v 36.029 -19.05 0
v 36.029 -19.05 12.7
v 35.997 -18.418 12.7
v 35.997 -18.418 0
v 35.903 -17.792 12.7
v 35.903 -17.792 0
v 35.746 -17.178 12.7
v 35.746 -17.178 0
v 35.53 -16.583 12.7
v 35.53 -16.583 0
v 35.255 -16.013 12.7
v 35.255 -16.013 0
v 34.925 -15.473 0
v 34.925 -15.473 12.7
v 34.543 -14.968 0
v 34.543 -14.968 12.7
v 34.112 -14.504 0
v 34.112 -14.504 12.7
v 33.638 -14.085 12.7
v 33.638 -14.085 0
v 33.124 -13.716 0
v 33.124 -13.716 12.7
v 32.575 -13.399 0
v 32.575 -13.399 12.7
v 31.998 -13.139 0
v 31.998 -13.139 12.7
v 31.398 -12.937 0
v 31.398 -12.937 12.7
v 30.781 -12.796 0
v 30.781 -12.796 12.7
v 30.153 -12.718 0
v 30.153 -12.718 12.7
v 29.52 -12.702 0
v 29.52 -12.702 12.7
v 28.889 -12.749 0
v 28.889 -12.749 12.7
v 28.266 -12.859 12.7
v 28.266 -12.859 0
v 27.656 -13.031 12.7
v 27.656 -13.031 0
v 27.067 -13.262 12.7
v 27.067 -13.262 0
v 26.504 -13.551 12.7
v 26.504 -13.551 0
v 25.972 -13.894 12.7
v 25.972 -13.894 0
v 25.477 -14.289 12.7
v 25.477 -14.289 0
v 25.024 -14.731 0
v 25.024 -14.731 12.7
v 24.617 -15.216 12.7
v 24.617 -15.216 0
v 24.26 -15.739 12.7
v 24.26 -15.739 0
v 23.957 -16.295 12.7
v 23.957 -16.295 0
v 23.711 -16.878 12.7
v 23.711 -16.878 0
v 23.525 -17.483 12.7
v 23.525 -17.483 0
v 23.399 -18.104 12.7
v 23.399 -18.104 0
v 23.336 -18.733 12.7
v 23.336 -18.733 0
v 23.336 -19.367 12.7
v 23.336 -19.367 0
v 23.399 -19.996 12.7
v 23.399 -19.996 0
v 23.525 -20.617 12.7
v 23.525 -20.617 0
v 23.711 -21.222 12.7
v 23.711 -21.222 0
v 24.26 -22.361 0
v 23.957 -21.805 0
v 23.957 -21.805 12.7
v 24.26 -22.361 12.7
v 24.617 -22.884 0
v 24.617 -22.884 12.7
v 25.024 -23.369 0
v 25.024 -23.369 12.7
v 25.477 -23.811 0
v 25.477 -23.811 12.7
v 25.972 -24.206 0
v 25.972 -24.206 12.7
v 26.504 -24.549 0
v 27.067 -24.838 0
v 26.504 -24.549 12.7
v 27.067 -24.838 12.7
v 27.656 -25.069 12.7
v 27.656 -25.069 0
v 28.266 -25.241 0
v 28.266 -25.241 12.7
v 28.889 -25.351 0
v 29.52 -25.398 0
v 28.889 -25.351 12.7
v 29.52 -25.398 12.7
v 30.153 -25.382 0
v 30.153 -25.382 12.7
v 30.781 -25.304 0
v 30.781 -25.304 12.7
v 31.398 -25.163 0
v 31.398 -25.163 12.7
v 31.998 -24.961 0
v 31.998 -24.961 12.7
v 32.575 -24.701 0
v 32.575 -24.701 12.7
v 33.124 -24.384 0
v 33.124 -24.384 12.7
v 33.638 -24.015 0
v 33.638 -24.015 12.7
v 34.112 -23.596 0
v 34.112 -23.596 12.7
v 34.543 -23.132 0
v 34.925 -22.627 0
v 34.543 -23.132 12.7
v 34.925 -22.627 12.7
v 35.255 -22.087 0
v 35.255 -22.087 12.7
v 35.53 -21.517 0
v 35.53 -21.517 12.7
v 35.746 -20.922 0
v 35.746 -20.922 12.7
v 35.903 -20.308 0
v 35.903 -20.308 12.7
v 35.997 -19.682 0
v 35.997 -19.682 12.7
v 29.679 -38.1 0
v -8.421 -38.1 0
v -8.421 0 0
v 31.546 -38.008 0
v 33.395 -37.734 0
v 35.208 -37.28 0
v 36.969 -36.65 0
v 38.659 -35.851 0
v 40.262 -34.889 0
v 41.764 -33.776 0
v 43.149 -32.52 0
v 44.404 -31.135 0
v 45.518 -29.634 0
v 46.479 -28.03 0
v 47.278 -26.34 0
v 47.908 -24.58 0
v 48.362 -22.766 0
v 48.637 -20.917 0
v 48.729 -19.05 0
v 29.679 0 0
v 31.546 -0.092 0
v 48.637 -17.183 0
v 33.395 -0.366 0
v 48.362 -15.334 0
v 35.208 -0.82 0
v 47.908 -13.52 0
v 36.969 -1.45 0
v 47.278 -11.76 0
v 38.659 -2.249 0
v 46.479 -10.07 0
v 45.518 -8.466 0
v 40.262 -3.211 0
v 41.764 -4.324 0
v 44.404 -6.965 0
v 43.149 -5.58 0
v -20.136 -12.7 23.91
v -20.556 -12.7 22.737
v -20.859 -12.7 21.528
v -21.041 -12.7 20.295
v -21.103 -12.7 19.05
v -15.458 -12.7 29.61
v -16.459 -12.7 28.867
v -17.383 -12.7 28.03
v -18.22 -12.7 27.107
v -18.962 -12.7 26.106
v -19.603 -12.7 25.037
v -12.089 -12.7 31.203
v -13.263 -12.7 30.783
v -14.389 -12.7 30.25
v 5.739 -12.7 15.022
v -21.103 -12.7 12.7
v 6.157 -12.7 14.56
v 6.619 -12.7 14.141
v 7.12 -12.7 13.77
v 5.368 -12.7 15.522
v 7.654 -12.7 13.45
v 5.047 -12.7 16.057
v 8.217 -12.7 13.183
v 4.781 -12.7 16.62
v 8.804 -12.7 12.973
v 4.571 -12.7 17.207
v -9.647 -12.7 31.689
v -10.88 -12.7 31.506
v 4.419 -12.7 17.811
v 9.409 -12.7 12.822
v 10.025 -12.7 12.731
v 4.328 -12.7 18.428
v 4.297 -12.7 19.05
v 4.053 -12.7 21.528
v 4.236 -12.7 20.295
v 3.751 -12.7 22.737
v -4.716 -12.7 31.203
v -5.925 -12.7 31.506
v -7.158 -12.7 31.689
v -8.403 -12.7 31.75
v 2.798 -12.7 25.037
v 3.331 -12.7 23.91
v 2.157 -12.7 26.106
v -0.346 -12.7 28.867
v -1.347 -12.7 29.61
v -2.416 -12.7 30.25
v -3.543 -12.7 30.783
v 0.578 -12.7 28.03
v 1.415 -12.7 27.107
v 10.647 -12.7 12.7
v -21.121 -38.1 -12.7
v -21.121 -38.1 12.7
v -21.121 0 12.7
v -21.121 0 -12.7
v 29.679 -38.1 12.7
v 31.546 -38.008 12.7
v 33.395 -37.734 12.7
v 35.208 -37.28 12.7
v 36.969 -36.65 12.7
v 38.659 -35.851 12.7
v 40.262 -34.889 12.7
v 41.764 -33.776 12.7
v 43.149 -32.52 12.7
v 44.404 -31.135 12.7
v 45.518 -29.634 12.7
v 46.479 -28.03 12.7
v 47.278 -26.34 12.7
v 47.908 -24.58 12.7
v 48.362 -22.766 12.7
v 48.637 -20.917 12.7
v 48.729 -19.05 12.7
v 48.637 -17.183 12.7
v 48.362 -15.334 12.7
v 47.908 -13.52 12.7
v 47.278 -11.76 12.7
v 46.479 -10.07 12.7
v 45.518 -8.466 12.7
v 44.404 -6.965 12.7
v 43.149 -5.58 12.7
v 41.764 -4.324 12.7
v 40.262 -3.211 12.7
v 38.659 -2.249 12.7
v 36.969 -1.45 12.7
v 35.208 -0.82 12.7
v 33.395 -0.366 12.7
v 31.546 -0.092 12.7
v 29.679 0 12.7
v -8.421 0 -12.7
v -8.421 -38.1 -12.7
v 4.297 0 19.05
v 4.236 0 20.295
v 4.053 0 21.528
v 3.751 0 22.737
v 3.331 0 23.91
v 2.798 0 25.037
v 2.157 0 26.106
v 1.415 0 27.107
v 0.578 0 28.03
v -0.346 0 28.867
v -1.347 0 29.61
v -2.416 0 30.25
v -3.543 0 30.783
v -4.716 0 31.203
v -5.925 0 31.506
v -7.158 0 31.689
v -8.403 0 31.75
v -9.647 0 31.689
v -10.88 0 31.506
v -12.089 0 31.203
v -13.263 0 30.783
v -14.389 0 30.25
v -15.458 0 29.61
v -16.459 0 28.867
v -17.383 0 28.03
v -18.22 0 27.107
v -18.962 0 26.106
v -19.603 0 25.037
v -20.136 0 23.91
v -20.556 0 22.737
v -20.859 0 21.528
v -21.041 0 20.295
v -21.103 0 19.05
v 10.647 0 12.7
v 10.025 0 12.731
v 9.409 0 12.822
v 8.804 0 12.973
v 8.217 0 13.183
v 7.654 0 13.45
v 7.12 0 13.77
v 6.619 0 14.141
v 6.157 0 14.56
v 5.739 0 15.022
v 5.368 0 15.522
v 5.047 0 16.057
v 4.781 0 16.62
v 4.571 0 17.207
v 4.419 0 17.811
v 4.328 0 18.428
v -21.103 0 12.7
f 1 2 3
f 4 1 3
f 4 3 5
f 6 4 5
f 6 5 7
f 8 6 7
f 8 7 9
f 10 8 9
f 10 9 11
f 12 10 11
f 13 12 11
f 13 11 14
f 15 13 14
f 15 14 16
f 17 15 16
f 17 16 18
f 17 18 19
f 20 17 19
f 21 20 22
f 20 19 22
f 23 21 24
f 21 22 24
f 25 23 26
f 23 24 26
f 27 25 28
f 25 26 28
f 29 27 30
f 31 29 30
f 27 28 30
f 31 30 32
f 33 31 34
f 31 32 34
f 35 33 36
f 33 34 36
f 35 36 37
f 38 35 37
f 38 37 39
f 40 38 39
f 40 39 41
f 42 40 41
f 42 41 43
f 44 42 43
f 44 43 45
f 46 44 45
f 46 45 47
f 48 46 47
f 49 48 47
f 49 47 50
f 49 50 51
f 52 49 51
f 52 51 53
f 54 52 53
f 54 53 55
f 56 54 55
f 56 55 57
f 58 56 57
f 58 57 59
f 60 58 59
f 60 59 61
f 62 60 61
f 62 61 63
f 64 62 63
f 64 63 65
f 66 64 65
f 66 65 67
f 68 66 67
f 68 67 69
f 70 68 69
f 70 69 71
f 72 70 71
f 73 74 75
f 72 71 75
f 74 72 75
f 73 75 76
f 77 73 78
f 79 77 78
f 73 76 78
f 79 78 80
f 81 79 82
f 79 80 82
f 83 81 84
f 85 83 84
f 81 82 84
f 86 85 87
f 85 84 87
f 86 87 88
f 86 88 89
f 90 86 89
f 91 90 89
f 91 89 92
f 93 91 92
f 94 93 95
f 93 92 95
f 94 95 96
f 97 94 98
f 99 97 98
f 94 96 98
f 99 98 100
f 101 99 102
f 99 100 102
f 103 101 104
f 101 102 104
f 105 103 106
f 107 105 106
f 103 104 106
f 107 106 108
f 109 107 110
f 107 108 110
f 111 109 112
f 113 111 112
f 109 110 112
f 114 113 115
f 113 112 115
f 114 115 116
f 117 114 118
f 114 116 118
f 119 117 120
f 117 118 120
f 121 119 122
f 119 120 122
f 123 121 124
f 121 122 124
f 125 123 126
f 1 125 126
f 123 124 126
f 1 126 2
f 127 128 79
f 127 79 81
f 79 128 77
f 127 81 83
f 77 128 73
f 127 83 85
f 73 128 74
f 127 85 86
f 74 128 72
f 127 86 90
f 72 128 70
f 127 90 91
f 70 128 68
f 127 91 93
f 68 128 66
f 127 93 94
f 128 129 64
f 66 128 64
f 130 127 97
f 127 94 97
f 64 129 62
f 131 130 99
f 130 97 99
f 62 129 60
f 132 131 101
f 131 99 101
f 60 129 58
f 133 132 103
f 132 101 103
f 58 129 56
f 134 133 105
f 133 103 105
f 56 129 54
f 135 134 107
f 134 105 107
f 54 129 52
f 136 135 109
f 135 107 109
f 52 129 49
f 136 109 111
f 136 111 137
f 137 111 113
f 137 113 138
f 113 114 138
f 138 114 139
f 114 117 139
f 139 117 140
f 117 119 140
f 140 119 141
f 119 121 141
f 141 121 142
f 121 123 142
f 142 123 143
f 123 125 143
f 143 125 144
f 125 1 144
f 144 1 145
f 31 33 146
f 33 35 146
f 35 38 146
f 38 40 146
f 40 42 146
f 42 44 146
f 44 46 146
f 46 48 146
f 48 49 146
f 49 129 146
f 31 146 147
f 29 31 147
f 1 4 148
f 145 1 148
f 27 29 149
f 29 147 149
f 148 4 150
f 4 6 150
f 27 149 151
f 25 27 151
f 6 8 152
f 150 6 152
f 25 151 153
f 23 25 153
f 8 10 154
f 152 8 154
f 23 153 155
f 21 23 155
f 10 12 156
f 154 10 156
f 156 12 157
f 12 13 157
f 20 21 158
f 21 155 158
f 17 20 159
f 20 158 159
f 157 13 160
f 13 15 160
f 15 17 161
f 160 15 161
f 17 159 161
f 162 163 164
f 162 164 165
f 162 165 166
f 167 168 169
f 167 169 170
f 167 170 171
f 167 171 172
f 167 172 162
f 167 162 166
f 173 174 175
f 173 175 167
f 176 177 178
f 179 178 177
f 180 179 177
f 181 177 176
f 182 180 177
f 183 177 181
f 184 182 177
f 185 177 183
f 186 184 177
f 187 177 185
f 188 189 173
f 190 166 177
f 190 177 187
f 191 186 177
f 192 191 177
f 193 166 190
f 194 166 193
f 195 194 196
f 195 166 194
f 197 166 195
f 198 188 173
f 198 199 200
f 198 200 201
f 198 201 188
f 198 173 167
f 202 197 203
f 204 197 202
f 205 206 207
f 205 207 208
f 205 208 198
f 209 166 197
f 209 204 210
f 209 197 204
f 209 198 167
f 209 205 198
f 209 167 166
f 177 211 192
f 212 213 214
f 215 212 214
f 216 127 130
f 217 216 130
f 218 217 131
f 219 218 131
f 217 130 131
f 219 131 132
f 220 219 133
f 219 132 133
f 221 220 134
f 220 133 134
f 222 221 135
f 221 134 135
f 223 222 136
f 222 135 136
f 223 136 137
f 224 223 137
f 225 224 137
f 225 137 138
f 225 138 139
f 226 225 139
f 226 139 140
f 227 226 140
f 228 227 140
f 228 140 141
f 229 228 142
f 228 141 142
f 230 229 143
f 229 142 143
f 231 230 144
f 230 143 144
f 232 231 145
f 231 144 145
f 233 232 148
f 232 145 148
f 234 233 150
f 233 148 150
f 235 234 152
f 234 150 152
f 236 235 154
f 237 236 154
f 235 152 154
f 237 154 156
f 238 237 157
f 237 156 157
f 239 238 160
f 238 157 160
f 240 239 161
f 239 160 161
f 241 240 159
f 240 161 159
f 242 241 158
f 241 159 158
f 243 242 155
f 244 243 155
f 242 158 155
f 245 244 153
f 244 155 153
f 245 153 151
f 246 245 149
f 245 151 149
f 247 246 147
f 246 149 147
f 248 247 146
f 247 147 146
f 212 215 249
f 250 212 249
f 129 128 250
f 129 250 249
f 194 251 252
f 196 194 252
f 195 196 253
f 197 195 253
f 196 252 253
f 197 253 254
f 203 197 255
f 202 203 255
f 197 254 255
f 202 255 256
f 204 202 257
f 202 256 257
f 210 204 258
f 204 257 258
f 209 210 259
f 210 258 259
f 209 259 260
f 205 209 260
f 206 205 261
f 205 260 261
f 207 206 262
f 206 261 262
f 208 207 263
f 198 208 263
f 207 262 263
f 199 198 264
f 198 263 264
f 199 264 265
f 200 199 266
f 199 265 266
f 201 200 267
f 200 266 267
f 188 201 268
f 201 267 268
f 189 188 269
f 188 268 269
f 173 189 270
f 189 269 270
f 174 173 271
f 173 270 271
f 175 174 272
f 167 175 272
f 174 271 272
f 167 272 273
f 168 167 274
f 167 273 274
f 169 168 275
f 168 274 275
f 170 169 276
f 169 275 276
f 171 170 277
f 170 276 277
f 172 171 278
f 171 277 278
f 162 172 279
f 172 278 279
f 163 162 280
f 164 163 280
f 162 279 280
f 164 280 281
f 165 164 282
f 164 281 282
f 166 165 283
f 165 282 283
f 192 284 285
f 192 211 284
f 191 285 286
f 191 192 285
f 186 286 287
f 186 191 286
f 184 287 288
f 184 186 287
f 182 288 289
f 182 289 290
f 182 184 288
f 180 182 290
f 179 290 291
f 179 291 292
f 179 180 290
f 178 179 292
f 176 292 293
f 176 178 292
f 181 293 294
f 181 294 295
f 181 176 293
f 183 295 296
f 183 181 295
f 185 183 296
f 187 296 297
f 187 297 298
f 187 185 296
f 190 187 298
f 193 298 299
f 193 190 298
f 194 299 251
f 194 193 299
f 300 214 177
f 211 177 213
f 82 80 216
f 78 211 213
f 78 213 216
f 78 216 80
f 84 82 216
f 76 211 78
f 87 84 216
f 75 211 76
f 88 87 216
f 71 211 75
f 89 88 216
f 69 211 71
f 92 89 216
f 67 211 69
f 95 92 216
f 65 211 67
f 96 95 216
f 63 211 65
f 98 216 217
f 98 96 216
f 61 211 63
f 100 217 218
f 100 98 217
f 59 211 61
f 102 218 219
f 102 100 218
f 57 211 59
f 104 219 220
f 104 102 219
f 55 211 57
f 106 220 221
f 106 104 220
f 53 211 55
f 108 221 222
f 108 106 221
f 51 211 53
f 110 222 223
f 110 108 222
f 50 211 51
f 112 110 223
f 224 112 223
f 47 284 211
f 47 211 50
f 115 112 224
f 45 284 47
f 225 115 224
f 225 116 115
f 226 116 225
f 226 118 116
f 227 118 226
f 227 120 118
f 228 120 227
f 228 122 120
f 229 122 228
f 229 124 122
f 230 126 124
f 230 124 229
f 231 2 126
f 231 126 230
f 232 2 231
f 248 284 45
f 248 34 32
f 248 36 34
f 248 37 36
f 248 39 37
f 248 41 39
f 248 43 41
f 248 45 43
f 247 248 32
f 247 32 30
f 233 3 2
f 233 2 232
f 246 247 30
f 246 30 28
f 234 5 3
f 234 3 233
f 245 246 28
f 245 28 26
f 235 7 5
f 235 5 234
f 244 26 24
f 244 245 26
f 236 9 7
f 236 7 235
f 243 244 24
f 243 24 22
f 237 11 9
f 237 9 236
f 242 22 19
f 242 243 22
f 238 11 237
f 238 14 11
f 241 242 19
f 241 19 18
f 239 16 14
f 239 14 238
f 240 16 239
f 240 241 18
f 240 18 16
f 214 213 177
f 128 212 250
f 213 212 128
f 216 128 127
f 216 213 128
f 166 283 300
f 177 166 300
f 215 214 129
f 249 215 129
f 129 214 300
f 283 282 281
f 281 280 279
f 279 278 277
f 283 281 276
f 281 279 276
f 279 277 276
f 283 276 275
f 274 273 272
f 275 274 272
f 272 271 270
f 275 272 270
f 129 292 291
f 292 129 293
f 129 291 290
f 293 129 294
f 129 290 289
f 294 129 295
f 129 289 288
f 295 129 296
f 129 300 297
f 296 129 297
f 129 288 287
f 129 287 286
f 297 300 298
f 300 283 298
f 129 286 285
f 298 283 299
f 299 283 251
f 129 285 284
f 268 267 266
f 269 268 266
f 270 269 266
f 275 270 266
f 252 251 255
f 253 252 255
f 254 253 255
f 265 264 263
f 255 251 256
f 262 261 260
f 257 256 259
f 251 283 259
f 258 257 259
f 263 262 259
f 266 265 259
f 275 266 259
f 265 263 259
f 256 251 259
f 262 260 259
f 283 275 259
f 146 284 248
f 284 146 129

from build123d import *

# Parameters (mm, degrees)
F1_DEPTH = 12.7
F3_DEPTH = 12.7
F4_W     = 12.7
F4_H     = 38.1
F5_DEPTH = 12.7
F6_R     = 6.35
F7_DEPTH = 25.4
F8_R     = 6.34999


# Not quite as in the source:
# - a fillet or chamfer is up to 0.001 mm smaller than in the source, because OpenCascade refuses the exact size


with BuildPart() as f1:
    # F0 (on Top) → F1 (new body)
    with BuildSketch(Plane.XY):
        with BuildLine():
            ThreePointArc((29.6785237075, -38.1), (48.7285237075, -19.05), (29.6785237075, 0))
            Line((29.6785237075, 0), (-21.1214762925, 0))
            Line((-21.1214762925, 0), (-21.1214762925, -38.1))
            Line((-21.1214762925, -38.1), (29.6785237075, -38.1))
        make_face()
    extrude(amount=F1_DEPTH)

    # F2 (on Front) → F3 (join)
    with BuildSketch(Plane.XZ):
        with BuildLine():
            Line((-21.1026167169, 19.05), (-21.1026167169, 10.3077341521))
            Line((-21.1026167169, 10.3077341521), (4.2973832831, 10.3077341521))
            Line((4.2973832831, 10.3077341521), (4.2973832831, 19.05))
            ThreePointArc((4.2973832831, 19.05), (-8.4026167169, 31.75), (-21.1026167169, 19.05))
        make_face()
    extrude(amount=F3_DEPTH)

    # F4 (on face) → F5 (join)
    with BuildSketch(Plane.XY):
        with Locations((-14.7714762925, -19.05)):
            Rectangle(F4_W, F4_H)
    extrude(amount=-F5_DEPTH)

    # F6 (on face) → F7 (cut)
    with BuildSketch(Plane.XY.offset(12.7)):
        with Locations((29.6785237075, -19.05)):
            Circle(F6_R)
    extrude(amount=-F7_DEPTH, mode=Mode.SUBTRACT)

    # F8 (radius 6.35 in the source; OpenCascade refuses exactly that, so slightly less here)
    f8_edges = [f1.edges().sort_by_distance(p)[0] for p in [
        (4.297383, -6.35, 12.7),
    ]]
    fillet(f8_edges, radius=F8_R)


solid = f1.part
